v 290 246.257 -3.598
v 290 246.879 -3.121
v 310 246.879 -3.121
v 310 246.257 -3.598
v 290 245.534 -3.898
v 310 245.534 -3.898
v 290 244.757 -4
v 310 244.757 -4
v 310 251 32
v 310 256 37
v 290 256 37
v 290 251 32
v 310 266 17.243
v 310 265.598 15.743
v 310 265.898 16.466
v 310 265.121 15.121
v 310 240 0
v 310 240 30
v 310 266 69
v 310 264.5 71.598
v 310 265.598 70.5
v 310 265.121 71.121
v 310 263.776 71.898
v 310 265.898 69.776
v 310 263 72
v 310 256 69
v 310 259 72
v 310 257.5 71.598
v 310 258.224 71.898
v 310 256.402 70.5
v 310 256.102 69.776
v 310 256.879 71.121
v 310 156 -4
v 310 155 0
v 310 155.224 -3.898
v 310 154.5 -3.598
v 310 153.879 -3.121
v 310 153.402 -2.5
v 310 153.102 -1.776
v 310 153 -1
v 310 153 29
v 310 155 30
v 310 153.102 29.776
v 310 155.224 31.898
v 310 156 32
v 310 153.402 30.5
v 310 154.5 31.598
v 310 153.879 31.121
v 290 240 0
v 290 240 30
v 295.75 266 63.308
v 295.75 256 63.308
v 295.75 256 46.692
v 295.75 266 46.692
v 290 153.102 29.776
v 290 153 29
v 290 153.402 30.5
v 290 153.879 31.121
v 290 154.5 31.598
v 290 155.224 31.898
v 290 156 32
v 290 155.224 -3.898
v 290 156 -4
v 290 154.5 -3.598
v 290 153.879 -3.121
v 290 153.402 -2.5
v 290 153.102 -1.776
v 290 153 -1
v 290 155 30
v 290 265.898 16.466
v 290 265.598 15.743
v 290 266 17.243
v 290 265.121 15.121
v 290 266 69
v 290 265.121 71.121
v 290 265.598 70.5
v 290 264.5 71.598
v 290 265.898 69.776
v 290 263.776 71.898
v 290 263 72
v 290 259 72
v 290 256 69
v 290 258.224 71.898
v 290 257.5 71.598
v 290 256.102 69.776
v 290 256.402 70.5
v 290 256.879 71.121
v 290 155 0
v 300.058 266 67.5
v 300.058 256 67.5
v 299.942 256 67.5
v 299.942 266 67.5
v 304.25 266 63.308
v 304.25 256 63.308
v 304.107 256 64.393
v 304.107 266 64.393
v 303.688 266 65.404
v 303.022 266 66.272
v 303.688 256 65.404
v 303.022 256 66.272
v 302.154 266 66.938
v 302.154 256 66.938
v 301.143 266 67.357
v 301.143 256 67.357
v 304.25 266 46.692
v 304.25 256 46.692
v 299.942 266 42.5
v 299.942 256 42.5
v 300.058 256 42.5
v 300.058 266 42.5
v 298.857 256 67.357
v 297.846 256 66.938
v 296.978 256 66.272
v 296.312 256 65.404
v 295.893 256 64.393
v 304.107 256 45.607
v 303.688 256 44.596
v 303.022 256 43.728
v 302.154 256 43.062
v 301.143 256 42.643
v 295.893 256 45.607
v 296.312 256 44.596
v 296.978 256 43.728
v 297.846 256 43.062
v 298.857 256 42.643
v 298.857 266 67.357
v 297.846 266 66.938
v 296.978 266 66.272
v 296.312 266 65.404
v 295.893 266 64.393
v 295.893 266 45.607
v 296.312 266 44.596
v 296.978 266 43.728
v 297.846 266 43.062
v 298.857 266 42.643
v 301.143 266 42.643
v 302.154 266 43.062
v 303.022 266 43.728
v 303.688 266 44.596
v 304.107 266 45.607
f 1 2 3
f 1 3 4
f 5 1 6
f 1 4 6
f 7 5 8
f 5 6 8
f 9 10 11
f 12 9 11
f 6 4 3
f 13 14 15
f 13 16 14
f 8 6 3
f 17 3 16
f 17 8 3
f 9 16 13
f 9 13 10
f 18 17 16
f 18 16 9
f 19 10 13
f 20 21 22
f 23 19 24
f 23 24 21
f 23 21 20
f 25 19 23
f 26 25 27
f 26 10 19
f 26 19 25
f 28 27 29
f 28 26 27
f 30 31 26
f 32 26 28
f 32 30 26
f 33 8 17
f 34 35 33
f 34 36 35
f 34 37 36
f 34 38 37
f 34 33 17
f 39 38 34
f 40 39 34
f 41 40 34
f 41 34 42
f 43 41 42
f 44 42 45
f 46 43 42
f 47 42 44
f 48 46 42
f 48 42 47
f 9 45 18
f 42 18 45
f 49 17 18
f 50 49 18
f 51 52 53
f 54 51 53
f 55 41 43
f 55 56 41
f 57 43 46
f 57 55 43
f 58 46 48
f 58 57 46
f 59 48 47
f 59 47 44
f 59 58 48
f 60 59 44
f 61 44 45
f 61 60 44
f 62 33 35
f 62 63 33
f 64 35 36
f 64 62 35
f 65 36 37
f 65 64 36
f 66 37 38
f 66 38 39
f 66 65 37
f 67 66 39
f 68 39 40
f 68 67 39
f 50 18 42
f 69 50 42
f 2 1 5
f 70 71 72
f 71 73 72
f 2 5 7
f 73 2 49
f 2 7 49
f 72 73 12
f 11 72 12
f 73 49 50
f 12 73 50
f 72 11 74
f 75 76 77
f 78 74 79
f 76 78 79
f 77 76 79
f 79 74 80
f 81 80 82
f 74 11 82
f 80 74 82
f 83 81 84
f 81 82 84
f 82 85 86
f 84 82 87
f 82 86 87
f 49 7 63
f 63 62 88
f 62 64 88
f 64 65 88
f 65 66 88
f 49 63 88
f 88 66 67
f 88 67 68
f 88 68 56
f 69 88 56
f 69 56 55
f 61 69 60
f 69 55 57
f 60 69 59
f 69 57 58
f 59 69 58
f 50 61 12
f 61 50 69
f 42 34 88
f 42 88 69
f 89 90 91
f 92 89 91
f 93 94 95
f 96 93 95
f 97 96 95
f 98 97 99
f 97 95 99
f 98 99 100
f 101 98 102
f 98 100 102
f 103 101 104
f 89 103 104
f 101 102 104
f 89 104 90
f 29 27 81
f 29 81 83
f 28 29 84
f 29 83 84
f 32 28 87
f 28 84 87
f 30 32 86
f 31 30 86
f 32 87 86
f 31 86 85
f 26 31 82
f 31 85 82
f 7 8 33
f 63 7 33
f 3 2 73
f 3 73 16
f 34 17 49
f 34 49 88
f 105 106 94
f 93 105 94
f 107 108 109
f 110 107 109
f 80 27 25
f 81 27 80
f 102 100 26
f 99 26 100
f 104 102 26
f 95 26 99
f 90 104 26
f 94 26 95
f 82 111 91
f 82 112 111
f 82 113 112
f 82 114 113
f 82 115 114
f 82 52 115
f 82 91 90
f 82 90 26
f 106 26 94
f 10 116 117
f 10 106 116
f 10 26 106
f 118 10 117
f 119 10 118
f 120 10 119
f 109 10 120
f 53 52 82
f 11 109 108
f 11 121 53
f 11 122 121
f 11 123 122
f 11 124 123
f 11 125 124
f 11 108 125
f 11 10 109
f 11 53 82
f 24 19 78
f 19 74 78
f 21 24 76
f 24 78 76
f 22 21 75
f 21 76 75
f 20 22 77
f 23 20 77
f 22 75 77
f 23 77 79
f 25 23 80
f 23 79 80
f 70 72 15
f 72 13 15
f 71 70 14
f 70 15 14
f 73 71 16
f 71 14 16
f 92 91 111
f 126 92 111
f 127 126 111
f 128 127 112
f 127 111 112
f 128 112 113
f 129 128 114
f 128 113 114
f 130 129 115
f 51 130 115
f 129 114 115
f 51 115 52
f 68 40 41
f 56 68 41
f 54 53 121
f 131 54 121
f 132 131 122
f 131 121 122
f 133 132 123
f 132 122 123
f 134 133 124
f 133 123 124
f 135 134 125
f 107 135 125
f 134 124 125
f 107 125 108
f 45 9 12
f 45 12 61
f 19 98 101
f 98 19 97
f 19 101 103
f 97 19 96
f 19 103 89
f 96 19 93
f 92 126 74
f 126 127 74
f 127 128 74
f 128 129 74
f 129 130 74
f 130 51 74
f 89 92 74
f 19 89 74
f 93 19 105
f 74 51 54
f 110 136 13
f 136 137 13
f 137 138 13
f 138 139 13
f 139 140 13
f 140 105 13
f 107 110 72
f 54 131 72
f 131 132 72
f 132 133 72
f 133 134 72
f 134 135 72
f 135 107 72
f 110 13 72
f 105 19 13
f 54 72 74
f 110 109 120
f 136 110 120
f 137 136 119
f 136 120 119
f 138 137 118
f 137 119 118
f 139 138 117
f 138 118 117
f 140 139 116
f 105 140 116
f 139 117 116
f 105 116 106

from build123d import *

# Parameters (mm, degrees)
SKETCH011_W     = 20
SKETCH011_H     = 36
PAD004_DEPTH    = 25
SKETCH015_W     = 20
SKETCH015_H     = 10
PAD008_DEPTH    = 40
POCKET004_DEPTH = 10.001
SKETCH023_W     = 36
SKETCH023_H     = 88
SKETCH023_W_2   = 30
SKETCH023_H_2   = 85
PAD012_DEPTH    = 20
CHAMFER_SIZE    = 5
CHAMFER001_SIZE = 20
FILLET_R        = 3


with BuildPart() as part:
    # Sketch011 → Pad004 (new body)
    with BuildSketch(Plane(origin=(290, 240, 0), x_dir=(1, 0, 0), z_dir=(0, -1, 0))):
        with Locations((10, 15)):
            Rectangle(SKETCH011_W, SKETCH011_H)
    extrude(amount=-PAD004_DEPTH)

    # Sketch015 → Pad008 (join)
    with BuildSketch(Plane(origin=(0, 0, 33), x_dir=(-1, 0, 0), z_dir=(0, 0, 1))):
        with Locations((-300, -260)):
            Rectangle(SKETCH015_W, SKETCH015_H)
    extrude(amount=PAD008_DEPTH)

    # Sketch016 (on Face4 of Pad008) → Pocket004 (cut, through all)
    with BuildSketch(Plane.XZ.offset(-255)):
        with BuildLine():
            Line((299.941929, 43.5), (300.058071, 43.5))
            ThreePointArc((300.058071, 43.5), (303.022212, 44.727788), (304.25, 47.691929))
            Line((304.25, 47.691929), (304.25, 64.308071))
            ThreePointArc((304.25, 64.308071), (303.022212, 67.272212), (300.058071, 68.5))
            Line((300.058071, 68.5), (299.941929, 68.5))
            ThreePointArc((299.941929, 68.5), (296.977788, 67.272212), (295.75, 64.308071))
            Line((295.75, 64.308071), (295.75, 47.691929))
            ThreePointArc((295.75, 47.691929), (296.977788, 44.727788), (299.941929, 43.5))
        make_face()
    extrude(amount=-POCKET004_DEPTH, mode=Mode.SUBTRACT)

    # Sketch023 (on Face3 of Pocket004) → Pad012 (join)
    with BuildSketch(Plane(origin=(310, 0, 0), x_dir=(0, 0, 1), z_dir=(1, 0, 0))):
        with Locations((15, -196)):
            Rectangle(SKETCH023_W, SKETCH023_H)
        with Locations((16, -196.5)):
            Rectangle(SKETCH023_W_2, SKETCH023_H_2, mode=Mode.SUBTRACT)
    extrude(amount=-PAD012_DEPTH)

    # Chamfer
    chamfer_edges = [part.edges().sort_by_distance(p)[0] for p in [
        (300, 255, 33),
    ]]
    chamfer(chamfer_edges, length=CHAMFER_SIZE)

    # Chamfer001
    chamfer001_edges = [part.edges().sort_by_distance(p)[0] for p in [
        (300, 265, -3),
    ]]
    chamfer(chamfer001_edges, length=CHAMFER001_SIZE)

    # Fillet
    fillet_edges = [part.edges().sort_by_distance(p)[0] for p in [
        (300, 265, 73),
        (300, 255, 73),
        (300, 152, 33),
        (300, 152, -3),
        (300, 265, 17),
        (300, 245, -3),
    ]]
    fillet(fillet_edges, radius=FILLET_R)


with BuildPart() as part_1:
    # Body004 placement: moved
    add(part.part.moved(Location((0, 1, -1))))


solid = part_1.part
